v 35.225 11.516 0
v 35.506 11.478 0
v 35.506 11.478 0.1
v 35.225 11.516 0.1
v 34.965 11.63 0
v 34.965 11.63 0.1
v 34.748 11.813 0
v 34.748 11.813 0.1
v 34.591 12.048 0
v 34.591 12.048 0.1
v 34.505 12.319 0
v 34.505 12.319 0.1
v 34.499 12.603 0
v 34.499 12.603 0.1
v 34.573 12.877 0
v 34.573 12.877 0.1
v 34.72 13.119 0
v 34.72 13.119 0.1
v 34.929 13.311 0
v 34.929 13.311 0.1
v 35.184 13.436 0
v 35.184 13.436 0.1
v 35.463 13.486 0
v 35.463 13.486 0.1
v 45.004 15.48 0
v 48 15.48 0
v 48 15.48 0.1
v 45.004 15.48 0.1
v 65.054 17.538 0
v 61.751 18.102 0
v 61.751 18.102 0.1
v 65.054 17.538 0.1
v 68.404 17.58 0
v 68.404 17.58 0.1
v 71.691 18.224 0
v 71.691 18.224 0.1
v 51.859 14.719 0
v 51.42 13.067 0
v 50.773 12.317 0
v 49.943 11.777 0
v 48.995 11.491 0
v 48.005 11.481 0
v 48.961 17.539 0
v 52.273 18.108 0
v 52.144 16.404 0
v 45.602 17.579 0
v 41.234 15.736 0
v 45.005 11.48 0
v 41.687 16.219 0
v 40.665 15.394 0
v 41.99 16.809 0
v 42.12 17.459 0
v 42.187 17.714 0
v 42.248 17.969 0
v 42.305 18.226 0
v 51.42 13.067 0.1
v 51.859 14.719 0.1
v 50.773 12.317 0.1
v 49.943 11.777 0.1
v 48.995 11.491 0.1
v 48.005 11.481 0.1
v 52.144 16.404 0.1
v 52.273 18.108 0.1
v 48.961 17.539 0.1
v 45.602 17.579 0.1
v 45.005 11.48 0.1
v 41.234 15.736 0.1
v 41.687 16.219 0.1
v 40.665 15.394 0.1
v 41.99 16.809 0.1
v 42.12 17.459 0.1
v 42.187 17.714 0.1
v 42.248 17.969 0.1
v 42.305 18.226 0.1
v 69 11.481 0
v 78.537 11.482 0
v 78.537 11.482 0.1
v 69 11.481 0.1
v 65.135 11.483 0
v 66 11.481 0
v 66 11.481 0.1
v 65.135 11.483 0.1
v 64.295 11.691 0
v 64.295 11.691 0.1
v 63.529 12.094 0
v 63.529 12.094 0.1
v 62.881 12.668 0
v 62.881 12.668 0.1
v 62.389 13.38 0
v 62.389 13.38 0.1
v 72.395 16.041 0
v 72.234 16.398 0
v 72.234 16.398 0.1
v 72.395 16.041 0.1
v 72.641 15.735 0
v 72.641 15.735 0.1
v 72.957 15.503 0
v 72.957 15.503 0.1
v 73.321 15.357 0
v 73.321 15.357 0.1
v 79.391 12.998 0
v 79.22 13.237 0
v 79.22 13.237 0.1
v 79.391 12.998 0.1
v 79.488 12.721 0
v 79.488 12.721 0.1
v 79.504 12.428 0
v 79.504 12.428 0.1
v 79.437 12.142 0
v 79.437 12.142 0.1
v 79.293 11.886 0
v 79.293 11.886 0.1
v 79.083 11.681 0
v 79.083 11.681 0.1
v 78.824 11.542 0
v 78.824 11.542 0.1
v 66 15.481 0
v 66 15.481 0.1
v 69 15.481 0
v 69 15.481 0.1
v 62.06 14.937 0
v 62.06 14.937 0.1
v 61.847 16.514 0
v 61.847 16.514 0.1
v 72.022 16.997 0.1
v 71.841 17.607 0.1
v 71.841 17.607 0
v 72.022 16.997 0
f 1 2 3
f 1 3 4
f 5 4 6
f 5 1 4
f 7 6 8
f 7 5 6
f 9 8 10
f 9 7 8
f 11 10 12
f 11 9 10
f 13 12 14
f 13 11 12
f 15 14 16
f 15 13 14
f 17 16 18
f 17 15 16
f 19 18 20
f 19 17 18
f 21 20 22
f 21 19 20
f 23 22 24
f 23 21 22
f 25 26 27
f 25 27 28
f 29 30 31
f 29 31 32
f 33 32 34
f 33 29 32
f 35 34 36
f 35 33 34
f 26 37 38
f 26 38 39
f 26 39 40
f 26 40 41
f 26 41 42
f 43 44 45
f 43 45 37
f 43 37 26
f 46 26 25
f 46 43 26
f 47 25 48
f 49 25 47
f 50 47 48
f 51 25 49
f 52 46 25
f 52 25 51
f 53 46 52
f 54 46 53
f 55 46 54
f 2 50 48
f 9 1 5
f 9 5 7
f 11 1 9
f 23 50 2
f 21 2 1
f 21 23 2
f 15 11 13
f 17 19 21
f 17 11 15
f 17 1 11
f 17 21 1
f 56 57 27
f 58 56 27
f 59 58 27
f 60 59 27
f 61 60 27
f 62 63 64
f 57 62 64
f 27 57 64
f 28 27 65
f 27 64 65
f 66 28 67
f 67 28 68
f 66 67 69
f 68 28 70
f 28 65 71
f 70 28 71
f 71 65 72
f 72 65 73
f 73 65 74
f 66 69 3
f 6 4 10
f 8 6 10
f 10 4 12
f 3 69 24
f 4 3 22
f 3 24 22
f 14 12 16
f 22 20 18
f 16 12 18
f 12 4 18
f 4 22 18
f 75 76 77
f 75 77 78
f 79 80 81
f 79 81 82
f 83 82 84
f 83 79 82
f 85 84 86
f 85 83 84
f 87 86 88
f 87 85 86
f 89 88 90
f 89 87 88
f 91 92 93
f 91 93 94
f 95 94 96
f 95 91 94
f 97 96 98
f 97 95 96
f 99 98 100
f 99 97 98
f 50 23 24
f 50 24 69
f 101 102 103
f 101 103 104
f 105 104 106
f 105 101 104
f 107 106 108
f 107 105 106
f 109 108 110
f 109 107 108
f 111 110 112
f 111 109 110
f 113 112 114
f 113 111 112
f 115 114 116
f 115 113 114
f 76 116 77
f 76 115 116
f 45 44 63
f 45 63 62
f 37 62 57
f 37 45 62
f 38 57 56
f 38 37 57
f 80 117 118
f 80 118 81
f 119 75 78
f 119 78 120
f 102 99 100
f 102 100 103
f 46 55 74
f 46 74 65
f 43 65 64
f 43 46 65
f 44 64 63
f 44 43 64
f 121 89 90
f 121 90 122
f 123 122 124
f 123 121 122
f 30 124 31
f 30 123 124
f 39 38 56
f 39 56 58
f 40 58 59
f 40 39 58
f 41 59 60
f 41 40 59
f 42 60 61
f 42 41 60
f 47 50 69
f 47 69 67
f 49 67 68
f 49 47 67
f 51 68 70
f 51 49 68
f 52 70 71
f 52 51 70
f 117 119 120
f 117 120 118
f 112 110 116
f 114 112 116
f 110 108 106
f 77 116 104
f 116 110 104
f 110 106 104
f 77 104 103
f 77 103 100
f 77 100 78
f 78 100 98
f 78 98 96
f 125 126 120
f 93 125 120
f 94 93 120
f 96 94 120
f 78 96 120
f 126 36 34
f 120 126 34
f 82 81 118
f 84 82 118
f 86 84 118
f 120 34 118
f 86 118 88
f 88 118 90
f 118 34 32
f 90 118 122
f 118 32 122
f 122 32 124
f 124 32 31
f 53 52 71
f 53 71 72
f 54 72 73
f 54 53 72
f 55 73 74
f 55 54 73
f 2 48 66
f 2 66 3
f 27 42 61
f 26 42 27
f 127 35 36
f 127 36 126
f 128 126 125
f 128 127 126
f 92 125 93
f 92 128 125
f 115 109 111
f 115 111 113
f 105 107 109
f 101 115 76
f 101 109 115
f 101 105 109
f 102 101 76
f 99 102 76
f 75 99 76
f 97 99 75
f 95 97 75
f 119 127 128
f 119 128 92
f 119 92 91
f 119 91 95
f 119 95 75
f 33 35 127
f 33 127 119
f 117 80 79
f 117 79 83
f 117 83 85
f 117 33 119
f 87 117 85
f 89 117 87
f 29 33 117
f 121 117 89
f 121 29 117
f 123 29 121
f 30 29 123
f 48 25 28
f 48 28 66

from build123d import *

# Parameters (mm, degrees)
SALIENTE_EXTRUIR1_DEPTH   = 0.1
SALIENTE_EXTRUIR1_2_DEPTH = 0.1


with BuildPart() as part:
    # Model → Saliente-Extruir1 (new body)
    with BuildSketch(Plane.XY):
        with BuildLine():
            Line((48.004911327, 11.481121887), (48.000129117, 15.480179105))
            Line((48.000129117, 15.480179105), (45.004326118, 15.479740685))
            Line((45.004326118, 15.479740685), (45.004911497, 11.479740728))
            Line((45.004911497, 11.479740728), (35.506169055, 11.478350639))
            ThreePointArc((35.506169055, 11.478350639), (34.492366192, 12.460645884), (35.46295571, 13.485661095))
            Line((35.46295571, 13.485661095), (40.665125807, 15.394449439))
            ThreePointArc((40.665125807, 15.394449439), (41.687092497, 16.219441411), (42.120437187, 17.459296261))
            ThreePointArc((42.120437187, 17.459296261), (42.218278721, 17.841092612), (42.304716772, 18.225631144))
            ThreePointArc((42.304716772, 18.225631144), (47.280668403, 17.482783386), (52.272757778, 18.108052207))
            ThreePointArc((52.272757778, 18.108052207), (52.021066511, 15.55801224), (51.419828955, 13.067115668))
            ThreePointArc((51.419828955, 13.067115668), (49.943203878, 11.777094004), (48.004911327, 11.481121887))
        make_face()
    extrude(amount=SALIENTE_EXTRUIR1_DEPTH)


with BuildPart() as body_2:
    # Model → Saliente-Extruir1 2 (new body)
    with BuildSketch(Plane.XY):
        with BuildLine():
            Line((73.321058857, 15.357458735), (79.220381344, 13.23671285))
            ThreePointArc((79.220381344, 13.23671285), (79.437035814, 12.14193667), (78.537134291, 11.481897812))
            Line((78.537134291, 11.481897812), (69.000129117, 11.481496513))
            Line((69.000129117, 11.481496513), (69.000129117, 15.481496513))
            Line((69.000129117, 15.481496513), (66.000129117, 15.481496513))
            Line((66.000129117, 15.481496513), (66.000129117, 11.481496513))
            ThreePointArc((66.000129117, 11.481496513), (63.899495069, 11.869675073), (62.389176946, 13.380398463))
            ThreePointArc((62.389176946, 13.380398463), (61.938549185, 15.723282994), (61.751187513, 18.101742351))
            ThreePointArc((61.751187513, 18.101742351), (66.729705671, 17.482905475), (71.691433552, 18.224429965))
            ThreePointArc((71.691433552, 18.224429965), (71.92782379, 17.300929573), (72.234139379, 16.398209196))
            ThreePointArc((72.234139379, 16.398209196), (72.641217064, 15.735401829), (73.321058857, 15.357458735))
        make_face()
    extrude(amount=SALIENTE_EXTRUIR1_2_DEPTH)


solid = Compound([part.part, body_2.part])
